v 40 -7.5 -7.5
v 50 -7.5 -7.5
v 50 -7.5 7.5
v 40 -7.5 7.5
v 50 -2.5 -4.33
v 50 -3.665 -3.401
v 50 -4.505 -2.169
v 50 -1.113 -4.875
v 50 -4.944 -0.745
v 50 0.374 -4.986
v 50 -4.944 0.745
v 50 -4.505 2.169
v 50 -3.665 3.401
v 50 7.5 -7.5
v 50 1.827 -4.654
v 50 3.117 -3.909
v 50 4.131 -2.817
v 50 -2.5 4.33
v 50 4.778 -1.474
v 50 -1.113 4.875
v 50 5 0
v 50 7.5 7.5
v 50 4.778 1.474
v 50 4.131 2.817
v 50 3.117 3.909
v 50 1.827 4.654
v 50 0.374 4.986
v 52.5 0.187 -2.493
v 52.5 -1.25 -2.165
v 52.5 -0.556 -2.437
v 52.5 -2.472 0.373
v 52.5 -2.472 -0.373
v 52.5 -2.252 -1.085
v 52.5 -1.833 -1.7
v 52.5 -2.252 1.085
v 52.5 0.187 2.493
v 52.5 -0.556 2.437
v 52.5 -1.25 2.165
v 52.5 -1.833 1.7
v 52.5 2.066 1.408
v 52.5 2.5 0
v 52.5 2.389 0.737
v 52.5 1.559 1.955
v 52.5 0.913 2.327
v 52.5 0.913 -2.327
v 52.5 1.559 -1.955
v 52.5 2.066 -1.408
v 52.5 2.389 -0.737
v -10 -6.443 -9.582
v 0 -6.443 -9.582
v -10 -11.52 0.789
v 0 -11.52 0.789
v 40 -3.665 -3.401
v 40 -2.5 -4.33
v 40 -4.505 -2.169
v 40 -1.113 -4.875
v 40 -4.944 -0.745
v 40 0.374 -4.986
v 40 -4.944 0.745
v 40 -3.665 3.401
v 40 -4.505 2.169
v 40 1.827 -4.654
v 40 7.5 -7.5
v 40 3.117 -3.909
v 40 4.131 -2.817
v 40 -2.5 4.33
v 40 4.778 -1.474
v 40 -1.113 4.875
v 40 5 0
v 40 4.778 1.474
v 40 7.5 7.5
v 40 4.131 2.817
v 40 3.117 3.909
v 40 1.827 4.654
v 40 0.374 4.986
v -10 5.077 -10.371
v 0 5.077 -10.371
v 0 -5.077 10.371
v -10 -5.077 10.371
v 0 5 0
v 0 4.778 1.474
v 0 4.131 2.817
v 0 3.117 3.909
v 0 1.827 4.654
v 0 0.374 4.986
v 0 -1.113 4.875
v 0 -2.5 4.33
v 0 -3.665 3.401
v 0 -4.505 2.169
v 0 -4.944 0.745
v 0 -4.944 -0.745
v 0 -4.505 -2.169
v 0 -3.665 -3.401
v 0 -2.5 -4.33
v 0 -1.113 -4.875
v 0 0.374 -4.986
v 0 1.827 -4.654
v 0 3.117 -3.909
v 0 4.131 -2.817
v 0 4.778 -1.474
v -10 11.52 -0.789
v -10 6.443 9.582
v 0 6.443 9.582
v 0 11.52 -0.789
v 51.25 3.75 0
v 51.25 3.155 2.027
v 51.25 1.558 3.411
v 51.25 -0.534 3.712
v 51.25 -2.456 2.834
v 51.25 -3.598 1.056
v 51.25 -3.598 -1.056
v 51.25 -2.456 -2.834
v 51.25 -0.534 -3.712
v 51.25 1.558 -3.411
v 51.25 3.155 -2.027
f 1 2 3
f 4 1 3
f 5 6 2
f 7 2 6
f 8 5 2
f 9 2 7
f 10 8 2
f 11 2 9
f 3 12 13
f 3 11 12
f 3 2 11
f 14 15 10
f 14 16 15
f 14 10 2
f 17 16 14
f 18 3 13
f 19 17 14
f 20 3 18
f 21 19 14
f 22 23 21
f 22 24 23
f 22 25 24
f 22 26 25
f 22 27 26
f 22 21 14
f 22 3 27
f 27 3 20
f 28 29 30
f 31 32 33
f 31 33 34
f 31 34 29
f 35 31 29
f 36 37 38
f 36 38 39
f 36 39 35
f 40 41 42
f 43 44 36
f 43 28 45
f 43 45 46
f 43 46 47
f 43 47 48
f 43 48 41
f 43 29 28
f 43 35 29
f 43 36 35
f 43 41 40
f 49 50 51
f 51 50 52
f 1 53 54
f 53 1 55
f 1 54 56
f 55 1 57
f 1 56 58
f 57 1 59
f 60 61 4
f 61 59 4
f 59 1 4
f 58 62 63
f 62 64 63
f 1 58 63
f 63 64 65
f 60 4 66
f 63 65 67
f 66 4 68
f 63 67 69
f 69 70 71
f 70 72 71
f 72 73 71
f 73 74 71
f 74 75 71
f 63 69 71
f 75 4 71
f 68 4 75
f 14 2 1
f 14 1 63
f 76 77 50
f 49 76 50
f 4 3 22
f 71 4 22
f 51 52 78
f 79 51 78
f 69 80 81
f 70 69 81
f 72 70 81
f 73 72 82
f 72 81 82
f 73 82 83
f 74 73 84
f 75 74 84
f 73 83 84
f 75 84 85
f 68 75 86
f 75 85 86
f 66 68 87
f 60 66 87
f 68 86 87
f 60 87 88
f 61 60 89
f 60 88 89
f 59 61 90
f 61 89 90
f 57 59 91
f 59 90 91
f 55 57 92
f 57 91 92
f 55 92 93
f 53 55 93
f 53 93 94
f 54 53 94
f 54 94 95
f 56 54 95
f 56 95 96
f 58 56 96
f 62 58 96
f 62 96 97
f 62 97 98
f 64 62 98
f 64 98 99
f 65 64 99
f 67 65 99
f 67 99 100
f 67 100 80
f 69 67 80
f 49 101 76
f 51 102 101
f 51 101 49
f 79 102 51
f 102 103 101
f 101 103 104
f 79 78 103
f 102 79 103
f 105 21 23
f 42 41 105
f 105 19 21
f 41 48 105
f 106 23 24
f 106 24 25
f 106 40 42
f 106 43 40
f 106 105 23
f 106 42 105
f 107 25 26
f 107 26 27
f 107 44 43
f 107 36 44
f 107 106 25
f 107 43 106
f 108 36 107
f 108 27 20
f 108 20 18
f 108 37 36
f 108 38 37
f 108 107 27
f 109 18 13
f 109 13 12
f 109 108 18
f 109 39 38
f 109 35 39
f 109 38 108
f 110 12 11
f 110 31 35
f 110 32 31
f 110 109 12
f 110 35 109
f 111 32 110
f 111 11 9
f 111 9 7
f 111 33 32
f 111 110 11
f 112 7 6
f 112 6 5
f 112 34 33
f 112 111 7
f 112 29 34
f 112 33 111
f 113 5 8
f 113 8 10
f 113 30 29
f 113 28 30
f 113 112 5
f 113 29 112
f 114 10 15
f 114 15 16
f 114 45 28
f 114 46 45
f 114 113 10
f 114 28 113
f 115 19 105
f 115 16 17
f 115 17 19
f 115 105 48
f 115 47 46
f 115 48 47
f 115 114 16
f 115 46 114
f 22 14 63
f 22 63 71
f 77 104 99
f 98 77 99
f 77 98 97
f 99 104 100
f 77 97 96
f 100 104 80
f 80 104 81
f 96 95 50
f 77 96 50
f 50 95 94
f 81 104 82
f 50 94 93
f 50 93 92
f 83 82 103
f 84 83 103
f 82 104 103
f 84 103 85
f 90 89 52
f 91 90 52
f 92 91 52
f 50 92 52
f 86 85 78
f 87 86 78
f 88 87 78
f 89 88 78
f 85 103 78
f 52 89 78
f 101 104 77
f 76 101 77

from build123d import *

# Parameters (mm, degrees)
F0_R     = 5
F1_DEPTH = 50
F3_DEPTH = 10
F4_W     = 15
F4_H     = 15
F4_R     = 5
F5_DEPTH = 10
F6_R     = 5
F7_DEPTH = 2.5
F8_SIZE  = 2.49999


# Not quite as in the source:
# - a fillet or chamfer is up to 0.001 mm smaller than in the source, because OpenCascade refuses the exact size


with BuildPart() as f1:
    # F0 (on Right) → F1 (new body)
    with BuildSketch(Plane.YZ):
        Circle(F0_R)
    extrude(amount=F1_DEPTH)

    # F2 (on face) → F3 (join)
    with BuildSketch(Plane(origin=(0, 0, 0), x_dir=(0, -1, 0), z_dir=(-1, 0, 0))):
        Polygon((11.5200223266, 0.788935313), (5.0767731403, 10.3710996435), (-6.4432491863, 9.5821643305), (-11.5200223266, -0.788935313), (-5.0767731403, -10.3710996435), (6.4432491863, -9.5821643305), align=None)
    extrude(amount=F3_DEPTH)

    # F4 (on face) → F5 (join)
    with BuildSketch(Plane.YZ.offset(50)):
        Rectangle(F4_W, F4_H)
        Circle(F4_R, mode=Mode.SUBTRACT)
    extrude(amount=-F5_DEPTH)

    # F6 (on face) → F7 (join)
    with BuildSketch(Plane.YZ.offset(50)):
        Circle(F6_R)
    extrude(amount=F7_DEPTH)

    # F8 (size 2.5 in the source; OpenCascade refuses exactly that, so slightly less here)
    f8_edges = [f1.edges().sort_by_distance(p)[0] for p in [
        (52.5, -5, 0),
    ]]
    chamfer(f8_edges, length=F8_SIZE)


solid = f1.part
